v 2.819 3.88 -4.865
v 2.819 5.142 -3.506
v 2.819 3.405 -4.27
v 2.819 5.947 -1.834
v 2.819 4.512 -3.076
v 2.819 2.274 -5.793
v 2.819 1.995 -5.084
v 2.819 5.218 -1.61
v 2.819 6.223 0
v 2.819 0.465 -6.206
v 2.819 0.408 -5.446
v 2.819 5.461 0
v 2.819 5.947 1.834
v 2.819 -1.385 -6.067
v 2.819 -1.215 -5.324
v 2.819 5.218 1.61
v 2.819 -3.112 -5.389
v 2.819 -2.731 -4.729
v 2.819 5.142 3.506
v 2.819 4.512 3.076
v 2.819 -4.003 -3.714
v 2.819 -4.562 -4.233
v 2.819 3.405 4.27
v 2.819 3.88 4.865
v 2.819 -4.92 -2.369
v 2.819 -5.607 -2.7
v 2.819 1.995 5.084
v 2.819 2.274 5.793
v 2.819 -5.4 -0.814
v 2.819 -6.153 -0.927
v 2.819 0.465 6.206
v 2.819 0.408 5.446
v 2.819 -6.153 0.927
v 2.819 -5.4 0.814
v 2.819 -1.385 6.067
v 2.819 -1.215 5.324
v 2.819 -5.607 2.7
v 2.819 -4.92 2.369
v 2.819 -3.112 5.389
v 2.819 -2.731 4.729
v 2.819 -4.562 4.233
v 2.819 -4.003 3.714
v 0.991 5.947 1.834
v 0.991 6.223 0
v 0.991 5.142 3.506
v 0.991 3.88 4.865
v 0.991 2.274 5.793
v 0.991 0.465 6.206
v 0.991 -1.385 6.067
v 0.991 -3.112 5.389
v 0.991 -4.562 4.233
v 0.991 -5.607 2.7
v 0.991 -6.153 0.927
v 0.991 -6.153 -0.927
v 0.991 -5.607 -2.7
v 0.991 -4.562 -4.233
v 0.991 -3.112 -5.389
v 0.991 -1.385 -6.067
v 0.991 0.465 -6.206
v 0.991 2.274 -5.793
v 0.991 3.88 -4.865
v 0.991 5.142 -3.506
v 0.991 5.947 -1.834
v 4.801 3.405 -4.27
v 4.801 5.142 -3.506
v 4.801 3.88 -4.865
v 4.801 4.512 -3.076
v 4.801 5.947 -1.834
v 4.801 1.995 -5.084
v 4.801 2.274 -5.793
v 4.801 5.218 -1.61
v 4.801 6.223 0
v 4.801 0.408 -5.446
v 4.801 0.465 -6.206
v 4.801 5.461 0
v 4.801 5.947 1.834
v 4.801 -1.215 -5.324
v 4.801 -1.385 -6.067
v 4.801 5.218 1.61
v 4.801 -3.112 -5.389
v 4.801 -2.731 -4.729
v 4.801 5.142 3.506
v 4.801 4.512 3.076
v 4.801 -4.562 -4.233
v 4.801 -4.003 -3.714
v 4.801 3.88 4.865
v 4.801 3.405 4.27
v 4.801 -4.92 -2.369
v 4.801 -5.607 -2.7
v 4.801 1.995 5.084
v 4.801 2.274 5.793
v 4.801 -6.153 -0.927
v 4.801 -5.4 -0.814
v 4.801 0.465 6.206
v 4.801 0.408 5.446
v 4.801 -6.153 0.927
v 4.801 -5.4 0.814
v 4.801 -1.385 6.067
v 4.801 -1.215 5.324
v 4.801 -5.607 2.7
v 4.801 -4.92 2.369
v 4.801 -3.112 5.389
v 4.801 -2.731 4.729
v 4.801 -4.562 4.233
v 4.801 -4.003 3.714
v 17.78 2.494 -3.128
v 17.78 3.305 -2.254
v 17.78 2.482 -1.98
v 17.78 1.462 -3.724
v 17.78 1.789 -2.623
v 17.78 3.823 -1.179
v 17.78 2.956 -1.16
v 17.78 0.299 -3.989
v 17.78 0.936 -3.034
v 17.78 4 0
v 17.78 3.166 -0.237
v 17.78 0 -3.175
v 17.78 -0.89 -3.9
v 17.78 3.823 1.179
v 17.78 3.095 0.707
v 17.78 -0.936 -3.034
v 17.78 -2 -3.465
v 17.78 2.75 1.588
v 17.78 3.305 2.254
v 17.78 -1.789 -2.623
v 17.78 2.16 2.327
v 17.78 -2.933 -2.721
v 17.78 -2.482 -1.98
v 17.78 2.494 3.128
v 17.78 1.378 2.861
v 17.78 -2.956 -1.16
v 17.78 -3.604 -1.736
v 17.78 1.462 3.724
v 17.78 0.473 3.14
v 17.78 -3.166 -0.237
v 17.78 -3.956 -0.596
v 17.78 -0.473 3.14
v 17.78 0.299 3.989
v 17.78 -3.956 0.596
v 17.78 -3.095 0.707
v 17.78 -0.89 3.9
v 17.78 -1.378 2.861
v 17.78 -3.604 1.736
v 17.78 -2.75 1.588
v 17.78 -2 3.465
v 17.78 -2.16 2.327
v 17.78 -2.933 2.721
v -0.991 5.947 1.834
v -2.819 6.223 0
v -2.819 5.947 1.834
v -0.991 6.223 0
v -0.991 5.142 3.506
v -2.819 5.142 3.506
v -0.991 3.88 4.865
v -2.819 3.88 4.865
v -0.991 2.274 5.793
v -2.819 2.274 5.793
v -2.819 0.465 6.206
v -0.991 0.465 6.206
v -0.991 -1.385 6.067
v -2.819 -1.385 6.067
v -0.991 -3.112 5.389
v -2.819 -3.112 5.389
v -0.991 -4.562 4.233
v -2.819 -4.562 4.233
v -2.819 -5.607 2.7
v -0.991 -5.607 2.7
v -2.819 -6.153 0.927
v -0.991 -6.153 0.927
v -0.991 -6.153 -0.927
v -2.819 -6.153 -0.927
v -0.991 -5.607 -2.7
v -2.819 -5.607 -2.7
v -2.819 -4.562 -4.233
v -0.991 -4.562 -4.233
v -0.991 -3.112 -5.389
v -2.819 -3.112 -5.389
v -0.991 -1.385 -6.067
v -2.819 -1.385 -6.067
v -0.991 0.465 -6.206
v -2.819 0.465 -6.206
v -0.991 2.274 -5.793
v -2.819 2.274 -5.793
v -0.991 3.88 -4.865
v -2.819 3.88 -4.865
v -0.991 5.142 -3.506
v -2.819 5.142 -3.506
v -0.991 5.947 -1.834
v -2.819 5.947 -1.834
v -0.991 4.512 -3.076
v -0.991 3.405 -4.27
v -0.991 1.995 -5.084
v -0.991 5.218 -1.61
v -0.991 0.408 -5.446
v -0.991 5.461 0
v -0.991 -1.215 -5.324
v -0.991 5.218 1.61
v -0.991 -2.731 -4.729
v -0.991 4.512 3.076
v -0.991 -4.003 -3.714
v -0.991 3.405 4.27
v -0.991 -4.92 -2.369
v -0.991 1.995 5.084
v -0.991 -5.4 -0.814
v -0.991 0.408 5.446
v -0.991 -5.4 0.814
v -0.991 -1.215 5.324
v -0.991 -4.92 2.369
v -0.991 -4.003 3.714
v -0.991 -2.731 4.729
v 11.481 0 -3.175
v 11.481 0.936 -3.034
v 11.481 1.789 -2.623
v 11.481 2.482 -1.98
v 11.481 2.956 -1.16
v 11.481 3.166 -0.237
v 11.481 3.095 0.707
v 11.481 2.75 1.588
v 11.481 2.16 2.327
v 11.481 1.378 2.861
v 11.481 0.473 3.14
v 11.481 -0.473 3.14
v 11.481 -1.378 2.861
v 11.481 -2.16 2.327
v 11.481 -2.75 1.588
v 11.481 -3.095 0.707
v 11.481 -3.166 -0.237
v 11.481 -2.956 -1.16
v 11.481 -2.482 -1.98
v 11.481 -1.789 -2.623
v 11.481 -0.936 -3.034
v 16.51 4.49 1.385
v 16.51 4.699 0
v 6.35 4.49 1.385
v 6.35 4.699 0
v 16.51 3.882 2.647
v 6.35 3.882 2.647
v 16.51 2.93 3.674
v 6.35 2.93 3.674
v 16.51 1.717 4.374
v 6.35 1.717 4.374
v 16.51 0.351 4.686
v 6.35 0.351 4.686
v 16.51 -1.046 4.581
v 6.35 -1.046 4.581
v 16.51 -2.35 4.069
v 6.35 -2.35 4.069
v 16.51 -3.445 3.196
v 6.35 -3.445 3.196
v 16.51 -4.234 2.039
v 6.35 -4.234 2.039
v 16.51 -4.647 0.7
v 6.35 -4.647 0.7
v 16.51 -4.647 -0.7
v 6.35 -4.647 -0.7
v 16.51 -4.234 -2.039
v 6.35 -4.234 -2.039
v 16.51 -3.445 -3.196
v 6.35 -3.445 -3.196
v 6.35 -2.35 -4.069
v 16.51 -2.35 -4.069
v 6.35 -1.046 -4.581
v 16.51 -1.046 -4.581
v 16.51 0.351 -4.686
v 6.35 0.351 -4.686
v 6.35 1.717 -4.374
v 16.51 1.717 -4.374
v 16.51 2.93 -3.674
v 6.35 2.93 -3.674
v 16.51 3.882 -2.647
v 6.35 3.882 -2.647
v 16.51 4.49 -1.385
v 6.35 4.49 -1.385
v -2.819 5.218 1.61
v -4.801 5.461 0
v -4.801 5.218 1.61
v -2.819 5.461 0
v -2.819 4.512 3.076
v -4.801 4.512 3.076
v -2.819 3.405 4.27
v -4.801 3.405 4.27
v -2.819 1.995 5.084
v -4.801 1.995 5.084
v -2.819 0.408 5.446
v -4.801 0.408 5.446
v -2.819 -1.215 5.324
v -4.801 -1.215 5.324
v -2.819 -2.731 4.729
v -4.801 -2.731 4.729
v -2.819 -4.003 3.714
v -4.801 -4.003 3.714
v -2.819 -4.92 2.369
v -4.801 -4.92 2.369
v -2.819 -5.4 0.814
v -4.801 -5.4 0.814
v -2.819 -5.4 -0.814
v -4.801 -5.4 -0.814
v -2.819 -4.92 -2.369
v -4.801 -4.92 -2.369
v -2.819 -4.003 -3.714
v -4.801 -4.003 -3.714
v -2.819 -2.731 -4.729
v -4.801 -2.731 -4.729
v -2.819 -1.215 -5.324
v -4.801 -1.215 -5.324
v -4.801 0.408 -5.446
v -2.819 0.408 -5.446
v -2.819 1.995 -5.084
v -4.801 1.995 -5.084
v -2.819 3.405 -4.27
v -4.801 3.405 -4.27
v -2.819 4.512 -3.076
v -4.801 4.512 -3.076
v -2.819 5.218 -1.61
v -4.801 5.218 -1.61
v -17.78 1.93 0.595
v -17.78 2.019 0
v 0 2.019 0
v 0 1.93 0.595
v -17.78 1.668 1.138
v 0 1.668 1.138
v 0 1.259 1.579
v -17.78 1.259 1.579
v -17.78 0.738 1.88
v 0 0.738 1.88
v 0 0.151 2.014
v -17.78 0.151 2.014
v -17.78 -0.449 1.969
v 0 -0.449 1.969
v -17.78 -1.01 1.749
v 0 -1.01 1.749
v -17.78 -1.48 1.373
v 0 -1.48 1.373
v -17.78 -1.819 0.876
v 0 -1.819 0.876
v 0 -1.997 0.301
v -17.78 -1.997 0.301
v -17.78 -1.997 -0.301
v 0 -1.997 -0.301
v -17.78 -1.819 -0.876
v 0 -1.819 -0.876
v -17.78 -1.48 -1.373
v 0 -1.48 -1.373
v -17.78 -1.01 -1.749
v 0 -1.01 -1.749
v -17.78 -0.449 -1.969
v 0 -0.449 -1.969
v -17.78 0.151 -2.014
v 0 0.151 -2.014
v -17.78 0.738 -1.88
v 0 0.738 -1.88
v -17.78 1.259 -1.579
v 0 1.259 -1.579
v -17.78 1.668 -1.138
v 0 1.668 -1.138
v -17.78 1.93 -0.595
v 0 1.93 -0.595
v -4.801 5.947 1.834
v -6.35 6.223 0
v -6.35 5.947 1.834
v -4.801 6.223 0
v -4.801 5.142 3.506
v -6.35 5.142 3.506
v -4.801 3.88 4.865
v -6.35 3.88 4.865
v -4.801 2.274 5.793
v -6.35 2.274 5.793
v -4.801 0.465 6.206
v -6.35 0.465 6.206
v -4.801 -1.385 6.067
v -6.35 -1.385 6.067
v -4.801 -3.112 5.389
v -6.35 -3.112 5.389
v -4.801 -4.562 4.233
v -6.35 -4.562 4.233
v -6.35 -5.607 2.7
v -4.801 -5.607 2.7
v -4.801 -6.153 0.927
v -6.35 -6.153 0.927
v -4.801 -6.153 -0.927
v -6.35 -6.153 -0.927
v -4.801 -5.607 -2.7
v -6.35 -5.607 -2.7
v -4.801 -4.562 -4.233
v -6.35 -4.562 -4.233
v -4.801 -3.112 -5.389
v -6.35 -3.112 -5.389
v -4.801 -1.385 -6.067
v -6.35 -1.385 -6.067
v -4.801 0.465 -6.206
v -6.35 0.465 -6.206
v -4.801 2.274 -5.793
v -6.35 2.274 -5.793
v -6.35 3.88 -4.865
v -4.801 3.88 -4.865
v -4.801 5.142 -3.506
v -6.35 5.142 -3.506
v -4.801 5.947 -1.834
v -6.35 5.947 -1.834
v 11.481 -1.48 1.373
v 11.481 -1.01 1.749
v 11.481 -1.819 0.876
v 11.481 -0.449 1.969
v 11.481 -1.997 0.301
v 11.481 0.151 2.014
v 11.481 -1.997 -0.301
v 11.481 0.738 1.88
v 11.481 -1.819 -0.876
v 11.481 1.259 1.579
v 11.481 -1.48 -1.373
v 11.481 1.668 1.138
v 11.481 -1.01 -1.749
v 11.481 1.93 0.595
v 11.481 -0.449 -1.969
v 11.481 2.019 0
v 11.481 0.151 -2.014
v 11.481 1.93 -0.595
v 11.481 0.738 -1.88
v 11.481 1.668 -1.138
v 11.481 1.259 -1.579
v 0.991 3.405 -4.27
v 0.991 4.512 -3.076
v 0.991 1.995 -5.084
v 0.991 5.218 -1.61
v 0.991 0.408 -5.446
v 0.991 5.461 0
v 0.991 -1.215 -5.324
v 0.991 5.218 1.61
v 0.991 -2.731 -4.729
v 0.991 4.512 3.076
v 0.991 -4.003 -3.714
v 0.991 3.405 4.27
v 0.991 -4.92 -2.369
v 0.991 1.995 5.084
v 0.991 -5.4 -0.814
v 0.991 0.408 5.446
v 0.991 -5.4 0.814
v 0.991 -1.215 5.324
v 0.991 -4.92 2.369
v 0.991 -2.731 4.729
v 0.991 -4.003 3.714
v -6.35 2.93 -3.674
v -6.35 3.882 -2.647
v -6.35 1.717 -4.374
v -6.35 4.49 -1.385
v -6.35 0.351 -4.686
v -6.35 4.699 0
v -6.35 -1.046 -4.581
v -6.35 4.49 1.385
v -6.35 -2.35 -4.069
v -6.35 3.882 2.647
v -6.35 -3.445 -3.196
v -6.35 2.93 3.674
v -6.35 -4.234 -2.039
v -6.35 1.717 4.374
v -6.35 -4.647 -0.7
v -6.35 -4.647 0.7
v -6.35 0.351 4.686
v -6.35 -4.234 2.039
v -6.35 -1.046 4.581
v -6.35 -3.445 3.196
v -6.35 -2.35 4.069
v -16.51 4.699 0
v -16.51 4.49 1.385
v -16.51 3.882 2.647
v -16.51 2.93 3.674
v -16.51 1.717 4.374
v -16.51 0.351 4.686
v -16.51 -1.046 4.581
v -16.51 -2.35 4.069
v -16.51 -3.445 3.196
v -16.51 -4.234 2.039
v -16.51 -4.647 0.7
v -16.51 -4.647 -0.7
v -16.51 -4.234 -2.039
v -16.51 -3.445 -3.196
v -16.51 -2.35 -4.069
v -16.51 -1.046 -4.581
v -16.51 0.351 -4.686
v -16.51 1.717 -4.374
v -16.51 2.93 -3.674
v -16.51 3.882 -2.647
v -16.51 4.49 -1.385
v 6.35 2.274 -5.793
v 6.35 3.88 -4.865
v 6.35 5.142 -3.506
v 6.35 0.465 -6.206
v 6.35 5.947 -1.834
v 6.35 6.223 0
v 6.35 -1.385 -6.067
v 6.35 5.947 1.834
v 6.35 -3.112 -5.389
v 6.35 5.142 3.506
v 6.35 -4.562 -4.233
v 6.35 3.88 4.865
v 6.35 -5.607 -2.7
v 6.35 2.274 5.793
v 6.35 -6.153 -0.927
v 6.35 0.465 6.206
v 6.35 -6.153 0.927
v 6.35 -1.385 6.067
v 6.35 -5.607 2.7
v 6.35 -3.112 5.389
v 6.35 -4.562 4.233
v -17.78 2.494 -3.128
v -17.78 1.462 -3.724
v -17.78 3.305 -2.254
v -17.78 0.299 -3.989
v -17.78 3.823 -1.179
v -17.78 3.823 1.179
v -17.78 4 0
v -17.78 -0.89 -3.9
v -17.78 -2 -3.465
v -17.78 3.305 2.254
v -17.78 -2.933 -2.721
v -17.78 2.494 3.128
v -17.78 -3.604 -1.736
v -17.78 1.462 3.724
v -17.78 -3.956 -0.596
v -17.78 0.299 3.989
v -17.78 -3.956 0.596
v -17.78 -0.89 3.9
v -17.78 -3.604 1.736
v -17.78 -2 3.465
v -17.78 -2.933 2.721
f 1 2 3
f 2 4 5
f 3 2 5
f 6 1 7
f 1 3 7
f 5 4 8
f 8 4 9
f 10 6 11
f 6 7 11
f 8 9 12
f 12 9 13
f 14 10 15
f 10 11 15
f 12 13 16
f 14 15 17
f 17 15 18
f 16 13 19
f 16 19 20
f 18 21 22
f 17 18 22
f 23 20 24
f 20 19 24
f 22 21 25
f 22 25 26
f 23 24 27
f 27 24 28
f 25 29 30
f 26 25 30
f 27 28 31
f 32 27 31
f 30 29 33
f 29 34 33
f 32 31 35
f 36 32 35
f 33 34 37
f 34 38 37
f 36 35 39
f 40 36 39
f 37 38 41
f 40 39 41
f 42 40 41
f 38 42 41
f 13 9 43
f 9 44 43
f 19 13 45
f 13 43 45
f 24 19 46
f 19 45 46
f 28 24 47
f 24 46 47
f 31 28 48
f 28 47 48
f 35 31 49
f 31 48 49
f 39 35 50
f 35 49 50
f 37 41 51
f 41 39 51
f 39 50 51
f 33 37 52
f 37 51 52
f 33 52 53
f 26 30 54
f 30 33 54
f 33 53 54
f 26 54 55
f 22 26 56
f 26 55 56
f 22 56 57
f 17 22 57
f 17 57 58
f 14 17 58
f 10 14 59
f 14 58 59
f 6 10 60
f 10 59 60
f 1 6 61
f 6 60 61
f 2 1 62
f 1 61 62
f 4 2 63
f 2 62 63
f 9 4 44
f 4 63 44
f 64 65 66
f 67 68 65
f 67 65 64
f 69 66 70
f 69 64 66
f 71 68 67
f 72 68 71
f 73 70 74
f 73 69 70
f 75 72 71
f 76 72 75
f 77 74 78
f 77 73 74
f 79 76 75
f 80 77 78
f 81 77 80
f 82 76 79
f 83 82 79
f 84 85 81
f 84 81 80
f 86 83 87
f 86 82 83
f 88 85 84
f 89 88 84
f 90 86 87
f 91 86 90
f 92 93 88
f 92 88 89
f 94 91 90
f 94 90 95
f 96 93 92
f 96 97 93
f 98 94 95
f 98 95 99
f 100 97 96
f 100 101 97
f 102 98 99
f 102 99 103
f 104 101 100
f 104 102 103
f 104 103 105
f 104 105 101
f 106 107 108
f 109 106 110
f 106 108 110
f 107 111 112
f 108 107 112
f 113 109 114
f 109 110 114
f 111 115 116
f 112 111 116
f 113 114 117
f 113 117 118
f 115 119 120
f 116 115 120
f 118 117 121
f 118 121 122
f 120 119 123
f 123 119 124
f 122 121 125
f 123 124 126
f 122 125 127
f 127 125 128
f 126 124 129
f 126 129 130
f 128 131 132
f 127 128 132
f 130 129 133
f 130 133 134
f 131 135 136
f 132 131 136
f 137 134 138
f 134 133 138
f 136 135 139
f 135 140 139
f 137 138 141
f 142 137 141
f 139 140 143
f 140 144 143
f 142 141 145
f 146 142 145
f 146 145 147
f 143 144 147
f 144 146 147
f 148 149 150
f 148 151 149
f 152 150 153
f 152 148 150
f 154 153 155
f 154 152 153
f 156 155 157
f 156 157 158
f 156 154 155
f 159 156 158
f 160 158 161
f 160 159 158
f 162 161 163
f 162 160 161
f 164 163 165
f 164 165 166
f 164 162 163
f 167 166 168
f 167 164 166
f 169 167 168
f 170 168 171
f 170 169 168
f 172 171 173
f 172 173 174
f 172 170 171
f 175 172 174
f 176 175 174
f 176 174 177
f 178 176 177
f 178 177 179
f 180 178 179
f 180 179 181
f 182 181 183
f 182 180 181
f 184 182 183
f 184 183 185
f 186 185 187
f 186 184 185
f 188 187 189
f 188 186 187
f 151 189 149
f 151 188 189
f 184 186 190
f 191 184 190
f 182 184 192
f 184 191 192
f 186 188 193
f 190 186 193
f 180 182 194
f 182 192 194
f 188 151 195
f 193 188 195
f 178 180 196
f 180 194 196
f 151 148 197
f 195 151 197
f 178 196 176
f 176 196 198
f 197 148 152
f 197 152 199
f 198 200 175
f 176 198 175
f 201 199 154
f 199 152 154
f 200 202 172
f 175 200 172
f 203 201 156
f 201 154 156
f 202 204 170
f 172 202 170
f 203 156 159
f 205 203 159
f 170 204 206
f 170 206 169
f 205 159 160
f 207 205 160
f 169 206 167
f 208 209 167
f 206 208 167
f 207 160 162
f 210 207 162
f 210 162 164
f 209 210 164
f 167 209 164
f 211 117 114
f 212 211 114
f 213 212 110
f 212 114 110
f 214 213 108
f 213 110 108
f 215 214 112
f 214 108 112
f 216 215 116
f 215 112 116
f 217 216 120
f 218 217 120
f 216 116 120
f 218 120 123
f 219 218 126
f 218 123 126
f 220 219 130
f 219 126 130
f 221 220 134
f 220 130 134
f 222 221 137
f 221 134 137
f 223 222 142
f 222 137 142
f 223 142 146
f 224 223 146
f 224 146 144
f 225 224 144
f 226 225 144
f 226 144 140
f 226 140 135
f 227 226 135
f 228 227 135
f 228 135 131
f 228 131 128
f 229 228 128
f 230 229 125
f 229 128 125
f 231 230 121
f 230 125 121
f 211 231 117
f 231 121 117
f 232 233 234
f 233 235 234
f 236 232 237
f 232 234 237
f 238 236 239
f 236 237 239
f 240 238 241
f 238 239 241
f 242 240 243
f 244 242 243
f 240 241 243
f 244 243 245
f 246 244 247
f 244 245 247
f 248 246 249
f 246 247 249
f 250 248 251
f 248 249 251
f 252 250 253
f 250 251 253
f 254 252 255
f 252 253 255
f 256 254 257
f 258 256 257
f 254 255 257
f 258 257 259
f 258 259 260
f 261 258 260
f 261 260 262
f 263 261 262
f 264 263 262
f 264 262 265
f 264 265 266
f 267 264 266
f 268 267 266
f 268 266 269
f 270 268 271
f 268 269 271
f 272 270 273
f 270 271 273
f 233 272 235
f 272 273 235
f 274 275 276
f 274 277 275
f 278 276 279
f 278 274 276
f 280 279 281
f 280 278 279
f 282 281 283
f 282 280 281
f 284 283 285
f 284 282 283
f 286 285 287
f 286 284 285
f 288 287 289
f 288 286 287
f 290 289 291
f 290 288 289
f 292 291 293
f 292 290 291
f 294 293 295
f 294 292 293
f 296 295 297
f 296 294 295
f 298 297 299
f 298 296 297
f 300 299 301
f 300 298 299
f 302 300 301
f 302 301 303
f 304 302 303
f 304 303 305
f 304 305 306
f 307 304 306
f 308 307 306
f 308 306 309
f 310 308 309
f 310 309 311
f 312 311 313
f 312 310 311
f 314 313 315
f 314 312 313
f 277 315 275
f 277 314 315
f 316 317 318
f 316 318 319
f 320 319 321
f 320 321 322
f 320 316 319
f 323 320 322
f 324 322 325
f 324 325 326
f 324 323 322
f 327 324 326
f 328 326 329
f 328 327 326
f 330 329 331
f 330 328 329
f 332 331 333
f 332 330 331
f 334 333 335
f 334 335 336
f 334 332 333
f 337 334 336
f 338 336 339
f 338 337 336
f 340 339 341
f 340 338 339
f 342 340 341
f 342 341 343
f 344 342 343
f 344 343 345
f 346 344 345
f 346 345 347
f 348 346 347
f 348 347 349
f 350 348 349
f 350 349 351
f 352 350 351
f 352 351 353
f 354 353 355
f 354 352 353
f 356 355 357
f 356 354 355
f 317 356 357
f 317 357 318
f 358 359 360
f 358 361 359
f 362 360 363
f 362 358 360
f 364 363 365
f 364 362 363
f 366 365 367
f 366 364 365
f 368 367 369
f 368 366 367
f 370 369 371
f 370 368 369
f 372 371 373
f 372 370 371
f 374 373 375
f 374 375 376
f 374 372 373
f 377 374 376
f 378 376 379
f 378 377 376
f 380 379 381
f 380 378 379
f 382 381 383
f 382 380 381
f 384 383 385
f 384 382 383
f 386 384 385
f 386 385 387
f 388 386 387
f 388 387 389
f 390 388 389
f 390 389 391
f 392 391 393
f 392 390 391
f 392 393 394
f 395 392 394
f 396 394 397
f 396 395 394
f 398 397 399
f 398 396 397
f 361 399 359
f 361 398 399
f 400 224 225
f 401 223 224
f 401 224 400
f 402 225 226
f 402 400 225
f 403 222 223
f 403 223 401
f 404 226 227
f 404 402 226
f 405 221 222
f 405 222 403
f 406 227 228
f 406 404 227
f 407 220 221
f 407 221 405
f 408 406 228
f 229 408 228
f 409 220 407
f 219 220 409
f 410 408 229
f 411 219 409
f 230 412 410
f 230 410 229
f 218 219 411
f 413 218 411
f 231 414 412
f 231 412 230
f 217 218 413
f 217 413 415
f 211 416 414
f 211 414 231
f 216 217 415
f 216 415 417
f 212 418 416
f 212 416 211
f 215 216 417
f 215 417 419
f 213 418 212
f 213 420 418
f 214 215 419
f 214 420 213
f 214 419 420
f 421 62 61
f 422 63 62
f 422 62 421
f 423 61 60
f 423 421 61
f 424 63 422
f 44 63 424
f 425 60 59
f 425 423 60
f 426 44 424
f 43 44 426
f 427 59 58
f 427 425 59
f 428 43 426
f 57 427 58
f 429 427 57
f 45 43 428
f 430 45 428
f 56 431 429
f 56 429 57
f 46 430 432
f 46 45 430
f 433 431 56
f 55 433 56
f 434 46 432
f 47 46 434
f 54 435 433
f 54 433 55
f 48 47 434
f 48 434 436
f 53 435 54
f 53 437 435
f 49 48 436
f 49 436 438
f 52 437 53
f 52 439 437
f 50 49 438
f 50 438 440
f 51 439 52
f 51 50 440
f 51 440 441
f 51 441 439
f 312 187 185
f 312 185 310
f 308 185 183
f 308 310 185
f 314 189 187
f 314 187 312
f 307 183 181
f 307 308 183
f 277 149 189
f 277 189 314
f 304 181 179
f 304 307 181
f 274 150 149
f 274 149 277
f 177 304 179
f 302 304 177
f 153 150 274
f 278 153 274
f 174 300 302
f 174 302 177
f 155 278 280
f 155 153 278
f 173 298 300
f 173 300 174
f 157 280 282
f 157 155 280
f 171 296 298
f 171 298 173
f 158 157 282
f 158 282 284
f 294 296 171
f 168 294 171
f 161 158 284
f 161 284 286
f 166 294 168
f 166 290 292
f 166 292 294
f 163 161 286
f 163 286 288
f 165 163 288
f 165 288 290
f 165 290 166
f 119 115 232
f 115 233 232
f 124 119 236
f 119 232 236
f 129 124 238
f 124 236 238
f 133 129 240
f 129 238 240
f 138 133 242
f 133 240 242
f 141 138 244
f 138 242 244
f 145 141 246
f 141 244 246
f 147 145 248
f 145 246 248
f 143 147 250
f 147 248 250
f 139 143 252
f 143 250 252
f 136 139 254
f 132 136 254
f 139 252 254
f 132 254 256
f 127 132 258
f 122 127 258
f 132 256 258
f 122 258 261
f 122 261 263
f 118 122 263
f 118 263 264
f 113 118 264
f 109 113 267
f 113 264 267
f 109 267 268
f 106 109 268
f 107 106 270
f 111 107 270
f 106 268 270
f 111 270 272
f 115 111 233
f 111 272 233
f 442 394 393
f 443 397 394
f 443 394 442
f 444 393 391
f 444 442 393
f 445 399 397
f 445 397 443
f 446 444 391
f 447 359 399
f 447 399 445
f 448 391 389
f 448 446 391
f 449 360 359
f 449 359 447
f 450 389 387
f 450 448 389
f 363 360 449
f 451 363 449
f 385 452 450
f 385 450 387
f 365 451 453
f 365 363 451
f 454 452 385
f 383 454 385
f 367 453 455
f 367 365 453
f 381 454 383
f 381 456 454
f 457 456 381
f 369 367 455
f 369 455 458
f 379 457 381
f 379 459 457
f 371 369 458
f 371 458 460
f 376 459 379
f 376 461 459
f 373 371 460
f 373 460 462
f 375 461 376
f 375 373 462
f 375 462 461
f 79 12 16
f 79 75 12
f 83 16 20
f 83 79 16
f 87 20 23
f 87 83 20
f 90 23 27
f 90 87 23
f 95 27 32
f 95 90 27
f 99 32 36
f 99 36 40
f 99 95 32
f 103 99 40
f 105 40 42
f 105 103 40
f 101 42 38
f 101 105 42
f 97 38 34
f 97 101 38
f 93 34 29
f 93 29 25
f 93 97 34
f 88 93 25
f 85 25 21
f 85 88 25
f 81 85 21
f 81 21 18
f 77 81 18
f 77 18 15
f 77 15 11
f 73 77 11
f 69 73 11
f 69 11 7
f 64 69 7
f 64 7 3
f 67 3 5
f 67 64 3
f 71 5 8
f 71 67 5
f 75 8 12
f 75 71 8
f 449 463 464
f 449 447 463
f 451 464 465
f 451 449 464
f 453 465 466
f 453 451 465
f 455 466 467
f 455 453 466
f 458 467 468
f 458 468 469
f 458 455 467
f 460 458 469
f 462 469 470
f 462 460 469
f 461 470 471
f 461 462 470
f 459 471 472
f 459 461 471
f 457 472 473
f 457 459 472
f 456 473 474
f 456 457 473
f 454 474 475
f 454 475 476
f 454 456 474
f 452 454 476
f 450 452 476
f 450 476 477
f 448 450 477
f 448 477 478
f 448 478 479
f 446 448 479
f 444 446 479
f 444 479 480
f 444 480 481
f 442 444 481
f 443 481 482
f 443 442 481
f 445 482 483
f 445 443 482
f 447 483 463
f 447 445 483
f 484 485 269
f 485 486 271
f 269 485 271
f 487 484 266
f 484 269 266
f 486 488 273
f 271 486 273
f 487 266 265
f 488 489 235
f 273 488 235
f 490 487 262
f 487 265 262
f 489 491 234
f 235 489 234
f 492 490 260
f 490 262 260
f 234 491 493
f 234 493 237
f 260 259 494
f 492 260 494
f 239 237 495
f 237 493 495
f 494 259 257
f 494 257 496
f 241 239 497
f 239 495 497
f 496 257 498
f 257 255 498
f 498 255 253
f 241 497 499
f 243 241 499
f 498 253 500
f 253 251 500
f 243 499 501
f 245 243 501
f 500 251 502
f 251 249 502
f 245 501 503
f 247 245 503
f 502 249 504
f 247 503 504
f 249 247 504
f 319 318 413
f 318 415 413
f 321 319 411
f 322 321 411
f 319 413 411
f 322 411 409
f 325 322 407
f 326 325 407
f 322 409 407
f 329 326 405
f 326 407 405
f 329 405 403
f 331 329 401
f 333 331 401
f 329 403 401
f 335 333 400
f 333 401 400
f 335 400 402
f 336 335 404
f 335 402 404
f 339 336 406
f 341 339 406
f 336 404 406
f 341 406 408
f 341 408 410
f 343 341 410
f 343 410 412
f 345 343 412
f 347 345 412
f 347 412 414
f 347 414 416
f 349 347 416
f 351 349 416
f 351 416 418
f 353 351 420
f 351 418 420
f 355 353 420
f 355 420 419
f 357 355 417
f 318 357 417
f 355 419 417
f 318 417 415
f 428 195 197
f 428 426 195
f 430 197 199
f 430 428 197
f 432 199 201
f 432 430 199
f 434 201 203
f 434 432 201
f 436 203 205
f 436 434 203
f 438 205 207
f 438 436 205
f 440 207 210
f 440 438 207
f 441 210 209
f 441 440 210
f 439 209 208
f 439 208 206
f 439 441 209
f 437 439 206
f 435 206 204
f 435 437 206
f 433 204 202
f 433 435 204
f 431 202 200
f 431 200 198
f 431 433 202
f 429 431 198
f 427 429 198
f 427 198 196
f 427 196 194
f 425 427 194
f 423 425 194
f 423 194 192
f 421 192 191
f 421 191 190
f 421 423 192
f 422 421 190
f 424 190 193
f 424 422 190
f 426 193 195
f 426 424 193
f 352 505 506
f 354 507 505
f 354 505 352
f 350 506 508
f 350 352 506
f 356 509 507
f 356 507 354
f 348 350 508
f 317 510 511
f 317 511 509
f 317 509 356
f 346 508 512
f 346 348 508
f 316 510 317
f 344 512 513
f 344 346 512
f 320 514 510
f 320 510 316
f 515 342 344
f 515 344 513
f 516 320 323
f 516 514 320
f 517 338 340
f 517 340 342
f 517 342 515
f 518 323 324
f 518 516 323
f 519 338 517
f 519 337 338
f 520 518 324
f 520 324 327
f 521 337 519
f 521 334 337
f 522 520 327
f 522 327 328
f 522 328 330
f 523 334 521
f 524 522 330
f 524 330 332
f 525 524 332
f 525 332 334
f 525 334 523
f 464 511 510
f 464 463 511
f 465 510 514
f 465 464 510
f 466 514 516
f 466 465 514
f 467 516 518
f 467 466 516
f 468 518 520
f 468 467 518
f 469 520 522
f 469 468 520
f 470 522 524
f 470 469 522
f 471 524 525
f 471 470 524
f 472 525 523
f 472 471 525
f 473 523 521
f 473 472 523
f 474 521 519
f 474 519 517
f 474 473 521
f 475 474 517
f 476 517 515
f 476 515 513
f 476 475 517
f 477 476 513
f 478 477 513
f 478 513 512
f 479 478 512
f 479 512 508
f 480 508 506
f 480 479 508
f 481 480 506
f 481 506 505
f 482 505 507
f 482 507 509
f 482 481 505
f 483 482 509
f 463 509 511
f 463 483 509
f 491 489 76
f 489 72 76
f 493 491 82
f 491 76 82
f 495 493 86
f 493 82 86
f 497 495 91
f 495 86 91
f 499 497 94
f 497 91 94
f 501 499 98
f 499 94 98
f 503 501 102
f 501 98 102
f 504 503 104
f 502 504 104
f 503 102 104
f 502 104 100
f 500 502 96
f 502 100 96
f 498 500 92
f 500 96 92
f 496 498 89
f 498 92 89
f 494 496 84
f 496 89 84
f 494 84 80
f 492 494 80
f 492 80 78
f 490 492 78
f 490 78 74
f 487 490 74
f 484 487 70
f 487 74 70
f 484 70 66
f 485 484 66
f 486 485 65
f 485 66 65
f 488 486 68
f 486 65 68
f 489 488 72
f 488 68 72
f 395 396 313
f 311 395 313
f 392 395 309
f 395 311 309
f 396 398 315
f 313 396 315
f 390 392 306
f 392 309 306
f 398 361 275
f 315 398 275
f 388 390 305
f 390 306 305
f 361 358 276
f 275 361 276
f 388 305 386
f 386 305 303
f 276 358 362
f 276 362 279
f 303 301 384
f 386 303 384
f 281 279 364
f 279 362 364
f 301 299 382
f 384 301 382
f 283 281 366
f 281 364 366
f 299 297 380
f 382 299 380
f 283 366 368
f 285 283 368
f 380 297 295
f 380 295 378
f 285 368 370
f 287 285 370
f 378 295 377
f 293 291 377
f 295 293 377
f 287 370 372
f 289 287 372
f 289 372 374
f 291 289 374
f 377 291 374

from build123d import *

# Parameters (mm, degrees)
SKETCH2_W          = 1.9812
SKETCH2_H          = 1.524
SKETCH3_R          = 3.175
CUT_EXTRUDE1_DEPTH = 6.2992


with BuildPart() as part:
    # Sketch1 → Revolve1 (revolve)
    with BuildSketch(Plane.XY):
        Polygon((0, 2.0193), (17.78, 2.0193), (17.78, 4.0005), (16.51, 4.699), (6.35, 4.699), (6.35, 6.223), (0, 6.223), align=None)
    revolve1 = revolve(axis=Axis((0, 0, 0), (1, 0, 0)))

    # Mirror1: Revolve1 across plane
    add(revolve1.mirror(Plane(origin=(0, 6.223, 0), x_dir=(0, 0, 1), z_dir=(1, 0, 0))))

    # Sketch2 → Cut-Revolve1 (revolve, cut)
    with BuildSketch(Plane.XY):
        with Locations((0, 6.223)):
            Rectangle(SKETCH2_W, SKETCH2_H)
        with Locations((-3.81, 6.223)):
            Rectangle(SKETCH2_W, SKETCH2_H)
        with Locations((3.81, 6.223)):
            Rectangle(SKETCH2_W, SKETCH2_H)
    revolve(axis=Axis((0, 0, 0), (1, 0, 0)), mode=Mode.SUBTRACT)

    # Sketch3 → Cut-Extrude1 (cut)
    with BuildSketch(Plane(origin=(17.78, 0, 0), x_dir=(0, 0, -1), z_dir=(1, 0, 0))):
        Circle(SKETCH3_R)
    extrude(amount=-CUT_EXTRUDE1_DEPTH, mode=Mode.SUBTRACT)


solid = part.part
